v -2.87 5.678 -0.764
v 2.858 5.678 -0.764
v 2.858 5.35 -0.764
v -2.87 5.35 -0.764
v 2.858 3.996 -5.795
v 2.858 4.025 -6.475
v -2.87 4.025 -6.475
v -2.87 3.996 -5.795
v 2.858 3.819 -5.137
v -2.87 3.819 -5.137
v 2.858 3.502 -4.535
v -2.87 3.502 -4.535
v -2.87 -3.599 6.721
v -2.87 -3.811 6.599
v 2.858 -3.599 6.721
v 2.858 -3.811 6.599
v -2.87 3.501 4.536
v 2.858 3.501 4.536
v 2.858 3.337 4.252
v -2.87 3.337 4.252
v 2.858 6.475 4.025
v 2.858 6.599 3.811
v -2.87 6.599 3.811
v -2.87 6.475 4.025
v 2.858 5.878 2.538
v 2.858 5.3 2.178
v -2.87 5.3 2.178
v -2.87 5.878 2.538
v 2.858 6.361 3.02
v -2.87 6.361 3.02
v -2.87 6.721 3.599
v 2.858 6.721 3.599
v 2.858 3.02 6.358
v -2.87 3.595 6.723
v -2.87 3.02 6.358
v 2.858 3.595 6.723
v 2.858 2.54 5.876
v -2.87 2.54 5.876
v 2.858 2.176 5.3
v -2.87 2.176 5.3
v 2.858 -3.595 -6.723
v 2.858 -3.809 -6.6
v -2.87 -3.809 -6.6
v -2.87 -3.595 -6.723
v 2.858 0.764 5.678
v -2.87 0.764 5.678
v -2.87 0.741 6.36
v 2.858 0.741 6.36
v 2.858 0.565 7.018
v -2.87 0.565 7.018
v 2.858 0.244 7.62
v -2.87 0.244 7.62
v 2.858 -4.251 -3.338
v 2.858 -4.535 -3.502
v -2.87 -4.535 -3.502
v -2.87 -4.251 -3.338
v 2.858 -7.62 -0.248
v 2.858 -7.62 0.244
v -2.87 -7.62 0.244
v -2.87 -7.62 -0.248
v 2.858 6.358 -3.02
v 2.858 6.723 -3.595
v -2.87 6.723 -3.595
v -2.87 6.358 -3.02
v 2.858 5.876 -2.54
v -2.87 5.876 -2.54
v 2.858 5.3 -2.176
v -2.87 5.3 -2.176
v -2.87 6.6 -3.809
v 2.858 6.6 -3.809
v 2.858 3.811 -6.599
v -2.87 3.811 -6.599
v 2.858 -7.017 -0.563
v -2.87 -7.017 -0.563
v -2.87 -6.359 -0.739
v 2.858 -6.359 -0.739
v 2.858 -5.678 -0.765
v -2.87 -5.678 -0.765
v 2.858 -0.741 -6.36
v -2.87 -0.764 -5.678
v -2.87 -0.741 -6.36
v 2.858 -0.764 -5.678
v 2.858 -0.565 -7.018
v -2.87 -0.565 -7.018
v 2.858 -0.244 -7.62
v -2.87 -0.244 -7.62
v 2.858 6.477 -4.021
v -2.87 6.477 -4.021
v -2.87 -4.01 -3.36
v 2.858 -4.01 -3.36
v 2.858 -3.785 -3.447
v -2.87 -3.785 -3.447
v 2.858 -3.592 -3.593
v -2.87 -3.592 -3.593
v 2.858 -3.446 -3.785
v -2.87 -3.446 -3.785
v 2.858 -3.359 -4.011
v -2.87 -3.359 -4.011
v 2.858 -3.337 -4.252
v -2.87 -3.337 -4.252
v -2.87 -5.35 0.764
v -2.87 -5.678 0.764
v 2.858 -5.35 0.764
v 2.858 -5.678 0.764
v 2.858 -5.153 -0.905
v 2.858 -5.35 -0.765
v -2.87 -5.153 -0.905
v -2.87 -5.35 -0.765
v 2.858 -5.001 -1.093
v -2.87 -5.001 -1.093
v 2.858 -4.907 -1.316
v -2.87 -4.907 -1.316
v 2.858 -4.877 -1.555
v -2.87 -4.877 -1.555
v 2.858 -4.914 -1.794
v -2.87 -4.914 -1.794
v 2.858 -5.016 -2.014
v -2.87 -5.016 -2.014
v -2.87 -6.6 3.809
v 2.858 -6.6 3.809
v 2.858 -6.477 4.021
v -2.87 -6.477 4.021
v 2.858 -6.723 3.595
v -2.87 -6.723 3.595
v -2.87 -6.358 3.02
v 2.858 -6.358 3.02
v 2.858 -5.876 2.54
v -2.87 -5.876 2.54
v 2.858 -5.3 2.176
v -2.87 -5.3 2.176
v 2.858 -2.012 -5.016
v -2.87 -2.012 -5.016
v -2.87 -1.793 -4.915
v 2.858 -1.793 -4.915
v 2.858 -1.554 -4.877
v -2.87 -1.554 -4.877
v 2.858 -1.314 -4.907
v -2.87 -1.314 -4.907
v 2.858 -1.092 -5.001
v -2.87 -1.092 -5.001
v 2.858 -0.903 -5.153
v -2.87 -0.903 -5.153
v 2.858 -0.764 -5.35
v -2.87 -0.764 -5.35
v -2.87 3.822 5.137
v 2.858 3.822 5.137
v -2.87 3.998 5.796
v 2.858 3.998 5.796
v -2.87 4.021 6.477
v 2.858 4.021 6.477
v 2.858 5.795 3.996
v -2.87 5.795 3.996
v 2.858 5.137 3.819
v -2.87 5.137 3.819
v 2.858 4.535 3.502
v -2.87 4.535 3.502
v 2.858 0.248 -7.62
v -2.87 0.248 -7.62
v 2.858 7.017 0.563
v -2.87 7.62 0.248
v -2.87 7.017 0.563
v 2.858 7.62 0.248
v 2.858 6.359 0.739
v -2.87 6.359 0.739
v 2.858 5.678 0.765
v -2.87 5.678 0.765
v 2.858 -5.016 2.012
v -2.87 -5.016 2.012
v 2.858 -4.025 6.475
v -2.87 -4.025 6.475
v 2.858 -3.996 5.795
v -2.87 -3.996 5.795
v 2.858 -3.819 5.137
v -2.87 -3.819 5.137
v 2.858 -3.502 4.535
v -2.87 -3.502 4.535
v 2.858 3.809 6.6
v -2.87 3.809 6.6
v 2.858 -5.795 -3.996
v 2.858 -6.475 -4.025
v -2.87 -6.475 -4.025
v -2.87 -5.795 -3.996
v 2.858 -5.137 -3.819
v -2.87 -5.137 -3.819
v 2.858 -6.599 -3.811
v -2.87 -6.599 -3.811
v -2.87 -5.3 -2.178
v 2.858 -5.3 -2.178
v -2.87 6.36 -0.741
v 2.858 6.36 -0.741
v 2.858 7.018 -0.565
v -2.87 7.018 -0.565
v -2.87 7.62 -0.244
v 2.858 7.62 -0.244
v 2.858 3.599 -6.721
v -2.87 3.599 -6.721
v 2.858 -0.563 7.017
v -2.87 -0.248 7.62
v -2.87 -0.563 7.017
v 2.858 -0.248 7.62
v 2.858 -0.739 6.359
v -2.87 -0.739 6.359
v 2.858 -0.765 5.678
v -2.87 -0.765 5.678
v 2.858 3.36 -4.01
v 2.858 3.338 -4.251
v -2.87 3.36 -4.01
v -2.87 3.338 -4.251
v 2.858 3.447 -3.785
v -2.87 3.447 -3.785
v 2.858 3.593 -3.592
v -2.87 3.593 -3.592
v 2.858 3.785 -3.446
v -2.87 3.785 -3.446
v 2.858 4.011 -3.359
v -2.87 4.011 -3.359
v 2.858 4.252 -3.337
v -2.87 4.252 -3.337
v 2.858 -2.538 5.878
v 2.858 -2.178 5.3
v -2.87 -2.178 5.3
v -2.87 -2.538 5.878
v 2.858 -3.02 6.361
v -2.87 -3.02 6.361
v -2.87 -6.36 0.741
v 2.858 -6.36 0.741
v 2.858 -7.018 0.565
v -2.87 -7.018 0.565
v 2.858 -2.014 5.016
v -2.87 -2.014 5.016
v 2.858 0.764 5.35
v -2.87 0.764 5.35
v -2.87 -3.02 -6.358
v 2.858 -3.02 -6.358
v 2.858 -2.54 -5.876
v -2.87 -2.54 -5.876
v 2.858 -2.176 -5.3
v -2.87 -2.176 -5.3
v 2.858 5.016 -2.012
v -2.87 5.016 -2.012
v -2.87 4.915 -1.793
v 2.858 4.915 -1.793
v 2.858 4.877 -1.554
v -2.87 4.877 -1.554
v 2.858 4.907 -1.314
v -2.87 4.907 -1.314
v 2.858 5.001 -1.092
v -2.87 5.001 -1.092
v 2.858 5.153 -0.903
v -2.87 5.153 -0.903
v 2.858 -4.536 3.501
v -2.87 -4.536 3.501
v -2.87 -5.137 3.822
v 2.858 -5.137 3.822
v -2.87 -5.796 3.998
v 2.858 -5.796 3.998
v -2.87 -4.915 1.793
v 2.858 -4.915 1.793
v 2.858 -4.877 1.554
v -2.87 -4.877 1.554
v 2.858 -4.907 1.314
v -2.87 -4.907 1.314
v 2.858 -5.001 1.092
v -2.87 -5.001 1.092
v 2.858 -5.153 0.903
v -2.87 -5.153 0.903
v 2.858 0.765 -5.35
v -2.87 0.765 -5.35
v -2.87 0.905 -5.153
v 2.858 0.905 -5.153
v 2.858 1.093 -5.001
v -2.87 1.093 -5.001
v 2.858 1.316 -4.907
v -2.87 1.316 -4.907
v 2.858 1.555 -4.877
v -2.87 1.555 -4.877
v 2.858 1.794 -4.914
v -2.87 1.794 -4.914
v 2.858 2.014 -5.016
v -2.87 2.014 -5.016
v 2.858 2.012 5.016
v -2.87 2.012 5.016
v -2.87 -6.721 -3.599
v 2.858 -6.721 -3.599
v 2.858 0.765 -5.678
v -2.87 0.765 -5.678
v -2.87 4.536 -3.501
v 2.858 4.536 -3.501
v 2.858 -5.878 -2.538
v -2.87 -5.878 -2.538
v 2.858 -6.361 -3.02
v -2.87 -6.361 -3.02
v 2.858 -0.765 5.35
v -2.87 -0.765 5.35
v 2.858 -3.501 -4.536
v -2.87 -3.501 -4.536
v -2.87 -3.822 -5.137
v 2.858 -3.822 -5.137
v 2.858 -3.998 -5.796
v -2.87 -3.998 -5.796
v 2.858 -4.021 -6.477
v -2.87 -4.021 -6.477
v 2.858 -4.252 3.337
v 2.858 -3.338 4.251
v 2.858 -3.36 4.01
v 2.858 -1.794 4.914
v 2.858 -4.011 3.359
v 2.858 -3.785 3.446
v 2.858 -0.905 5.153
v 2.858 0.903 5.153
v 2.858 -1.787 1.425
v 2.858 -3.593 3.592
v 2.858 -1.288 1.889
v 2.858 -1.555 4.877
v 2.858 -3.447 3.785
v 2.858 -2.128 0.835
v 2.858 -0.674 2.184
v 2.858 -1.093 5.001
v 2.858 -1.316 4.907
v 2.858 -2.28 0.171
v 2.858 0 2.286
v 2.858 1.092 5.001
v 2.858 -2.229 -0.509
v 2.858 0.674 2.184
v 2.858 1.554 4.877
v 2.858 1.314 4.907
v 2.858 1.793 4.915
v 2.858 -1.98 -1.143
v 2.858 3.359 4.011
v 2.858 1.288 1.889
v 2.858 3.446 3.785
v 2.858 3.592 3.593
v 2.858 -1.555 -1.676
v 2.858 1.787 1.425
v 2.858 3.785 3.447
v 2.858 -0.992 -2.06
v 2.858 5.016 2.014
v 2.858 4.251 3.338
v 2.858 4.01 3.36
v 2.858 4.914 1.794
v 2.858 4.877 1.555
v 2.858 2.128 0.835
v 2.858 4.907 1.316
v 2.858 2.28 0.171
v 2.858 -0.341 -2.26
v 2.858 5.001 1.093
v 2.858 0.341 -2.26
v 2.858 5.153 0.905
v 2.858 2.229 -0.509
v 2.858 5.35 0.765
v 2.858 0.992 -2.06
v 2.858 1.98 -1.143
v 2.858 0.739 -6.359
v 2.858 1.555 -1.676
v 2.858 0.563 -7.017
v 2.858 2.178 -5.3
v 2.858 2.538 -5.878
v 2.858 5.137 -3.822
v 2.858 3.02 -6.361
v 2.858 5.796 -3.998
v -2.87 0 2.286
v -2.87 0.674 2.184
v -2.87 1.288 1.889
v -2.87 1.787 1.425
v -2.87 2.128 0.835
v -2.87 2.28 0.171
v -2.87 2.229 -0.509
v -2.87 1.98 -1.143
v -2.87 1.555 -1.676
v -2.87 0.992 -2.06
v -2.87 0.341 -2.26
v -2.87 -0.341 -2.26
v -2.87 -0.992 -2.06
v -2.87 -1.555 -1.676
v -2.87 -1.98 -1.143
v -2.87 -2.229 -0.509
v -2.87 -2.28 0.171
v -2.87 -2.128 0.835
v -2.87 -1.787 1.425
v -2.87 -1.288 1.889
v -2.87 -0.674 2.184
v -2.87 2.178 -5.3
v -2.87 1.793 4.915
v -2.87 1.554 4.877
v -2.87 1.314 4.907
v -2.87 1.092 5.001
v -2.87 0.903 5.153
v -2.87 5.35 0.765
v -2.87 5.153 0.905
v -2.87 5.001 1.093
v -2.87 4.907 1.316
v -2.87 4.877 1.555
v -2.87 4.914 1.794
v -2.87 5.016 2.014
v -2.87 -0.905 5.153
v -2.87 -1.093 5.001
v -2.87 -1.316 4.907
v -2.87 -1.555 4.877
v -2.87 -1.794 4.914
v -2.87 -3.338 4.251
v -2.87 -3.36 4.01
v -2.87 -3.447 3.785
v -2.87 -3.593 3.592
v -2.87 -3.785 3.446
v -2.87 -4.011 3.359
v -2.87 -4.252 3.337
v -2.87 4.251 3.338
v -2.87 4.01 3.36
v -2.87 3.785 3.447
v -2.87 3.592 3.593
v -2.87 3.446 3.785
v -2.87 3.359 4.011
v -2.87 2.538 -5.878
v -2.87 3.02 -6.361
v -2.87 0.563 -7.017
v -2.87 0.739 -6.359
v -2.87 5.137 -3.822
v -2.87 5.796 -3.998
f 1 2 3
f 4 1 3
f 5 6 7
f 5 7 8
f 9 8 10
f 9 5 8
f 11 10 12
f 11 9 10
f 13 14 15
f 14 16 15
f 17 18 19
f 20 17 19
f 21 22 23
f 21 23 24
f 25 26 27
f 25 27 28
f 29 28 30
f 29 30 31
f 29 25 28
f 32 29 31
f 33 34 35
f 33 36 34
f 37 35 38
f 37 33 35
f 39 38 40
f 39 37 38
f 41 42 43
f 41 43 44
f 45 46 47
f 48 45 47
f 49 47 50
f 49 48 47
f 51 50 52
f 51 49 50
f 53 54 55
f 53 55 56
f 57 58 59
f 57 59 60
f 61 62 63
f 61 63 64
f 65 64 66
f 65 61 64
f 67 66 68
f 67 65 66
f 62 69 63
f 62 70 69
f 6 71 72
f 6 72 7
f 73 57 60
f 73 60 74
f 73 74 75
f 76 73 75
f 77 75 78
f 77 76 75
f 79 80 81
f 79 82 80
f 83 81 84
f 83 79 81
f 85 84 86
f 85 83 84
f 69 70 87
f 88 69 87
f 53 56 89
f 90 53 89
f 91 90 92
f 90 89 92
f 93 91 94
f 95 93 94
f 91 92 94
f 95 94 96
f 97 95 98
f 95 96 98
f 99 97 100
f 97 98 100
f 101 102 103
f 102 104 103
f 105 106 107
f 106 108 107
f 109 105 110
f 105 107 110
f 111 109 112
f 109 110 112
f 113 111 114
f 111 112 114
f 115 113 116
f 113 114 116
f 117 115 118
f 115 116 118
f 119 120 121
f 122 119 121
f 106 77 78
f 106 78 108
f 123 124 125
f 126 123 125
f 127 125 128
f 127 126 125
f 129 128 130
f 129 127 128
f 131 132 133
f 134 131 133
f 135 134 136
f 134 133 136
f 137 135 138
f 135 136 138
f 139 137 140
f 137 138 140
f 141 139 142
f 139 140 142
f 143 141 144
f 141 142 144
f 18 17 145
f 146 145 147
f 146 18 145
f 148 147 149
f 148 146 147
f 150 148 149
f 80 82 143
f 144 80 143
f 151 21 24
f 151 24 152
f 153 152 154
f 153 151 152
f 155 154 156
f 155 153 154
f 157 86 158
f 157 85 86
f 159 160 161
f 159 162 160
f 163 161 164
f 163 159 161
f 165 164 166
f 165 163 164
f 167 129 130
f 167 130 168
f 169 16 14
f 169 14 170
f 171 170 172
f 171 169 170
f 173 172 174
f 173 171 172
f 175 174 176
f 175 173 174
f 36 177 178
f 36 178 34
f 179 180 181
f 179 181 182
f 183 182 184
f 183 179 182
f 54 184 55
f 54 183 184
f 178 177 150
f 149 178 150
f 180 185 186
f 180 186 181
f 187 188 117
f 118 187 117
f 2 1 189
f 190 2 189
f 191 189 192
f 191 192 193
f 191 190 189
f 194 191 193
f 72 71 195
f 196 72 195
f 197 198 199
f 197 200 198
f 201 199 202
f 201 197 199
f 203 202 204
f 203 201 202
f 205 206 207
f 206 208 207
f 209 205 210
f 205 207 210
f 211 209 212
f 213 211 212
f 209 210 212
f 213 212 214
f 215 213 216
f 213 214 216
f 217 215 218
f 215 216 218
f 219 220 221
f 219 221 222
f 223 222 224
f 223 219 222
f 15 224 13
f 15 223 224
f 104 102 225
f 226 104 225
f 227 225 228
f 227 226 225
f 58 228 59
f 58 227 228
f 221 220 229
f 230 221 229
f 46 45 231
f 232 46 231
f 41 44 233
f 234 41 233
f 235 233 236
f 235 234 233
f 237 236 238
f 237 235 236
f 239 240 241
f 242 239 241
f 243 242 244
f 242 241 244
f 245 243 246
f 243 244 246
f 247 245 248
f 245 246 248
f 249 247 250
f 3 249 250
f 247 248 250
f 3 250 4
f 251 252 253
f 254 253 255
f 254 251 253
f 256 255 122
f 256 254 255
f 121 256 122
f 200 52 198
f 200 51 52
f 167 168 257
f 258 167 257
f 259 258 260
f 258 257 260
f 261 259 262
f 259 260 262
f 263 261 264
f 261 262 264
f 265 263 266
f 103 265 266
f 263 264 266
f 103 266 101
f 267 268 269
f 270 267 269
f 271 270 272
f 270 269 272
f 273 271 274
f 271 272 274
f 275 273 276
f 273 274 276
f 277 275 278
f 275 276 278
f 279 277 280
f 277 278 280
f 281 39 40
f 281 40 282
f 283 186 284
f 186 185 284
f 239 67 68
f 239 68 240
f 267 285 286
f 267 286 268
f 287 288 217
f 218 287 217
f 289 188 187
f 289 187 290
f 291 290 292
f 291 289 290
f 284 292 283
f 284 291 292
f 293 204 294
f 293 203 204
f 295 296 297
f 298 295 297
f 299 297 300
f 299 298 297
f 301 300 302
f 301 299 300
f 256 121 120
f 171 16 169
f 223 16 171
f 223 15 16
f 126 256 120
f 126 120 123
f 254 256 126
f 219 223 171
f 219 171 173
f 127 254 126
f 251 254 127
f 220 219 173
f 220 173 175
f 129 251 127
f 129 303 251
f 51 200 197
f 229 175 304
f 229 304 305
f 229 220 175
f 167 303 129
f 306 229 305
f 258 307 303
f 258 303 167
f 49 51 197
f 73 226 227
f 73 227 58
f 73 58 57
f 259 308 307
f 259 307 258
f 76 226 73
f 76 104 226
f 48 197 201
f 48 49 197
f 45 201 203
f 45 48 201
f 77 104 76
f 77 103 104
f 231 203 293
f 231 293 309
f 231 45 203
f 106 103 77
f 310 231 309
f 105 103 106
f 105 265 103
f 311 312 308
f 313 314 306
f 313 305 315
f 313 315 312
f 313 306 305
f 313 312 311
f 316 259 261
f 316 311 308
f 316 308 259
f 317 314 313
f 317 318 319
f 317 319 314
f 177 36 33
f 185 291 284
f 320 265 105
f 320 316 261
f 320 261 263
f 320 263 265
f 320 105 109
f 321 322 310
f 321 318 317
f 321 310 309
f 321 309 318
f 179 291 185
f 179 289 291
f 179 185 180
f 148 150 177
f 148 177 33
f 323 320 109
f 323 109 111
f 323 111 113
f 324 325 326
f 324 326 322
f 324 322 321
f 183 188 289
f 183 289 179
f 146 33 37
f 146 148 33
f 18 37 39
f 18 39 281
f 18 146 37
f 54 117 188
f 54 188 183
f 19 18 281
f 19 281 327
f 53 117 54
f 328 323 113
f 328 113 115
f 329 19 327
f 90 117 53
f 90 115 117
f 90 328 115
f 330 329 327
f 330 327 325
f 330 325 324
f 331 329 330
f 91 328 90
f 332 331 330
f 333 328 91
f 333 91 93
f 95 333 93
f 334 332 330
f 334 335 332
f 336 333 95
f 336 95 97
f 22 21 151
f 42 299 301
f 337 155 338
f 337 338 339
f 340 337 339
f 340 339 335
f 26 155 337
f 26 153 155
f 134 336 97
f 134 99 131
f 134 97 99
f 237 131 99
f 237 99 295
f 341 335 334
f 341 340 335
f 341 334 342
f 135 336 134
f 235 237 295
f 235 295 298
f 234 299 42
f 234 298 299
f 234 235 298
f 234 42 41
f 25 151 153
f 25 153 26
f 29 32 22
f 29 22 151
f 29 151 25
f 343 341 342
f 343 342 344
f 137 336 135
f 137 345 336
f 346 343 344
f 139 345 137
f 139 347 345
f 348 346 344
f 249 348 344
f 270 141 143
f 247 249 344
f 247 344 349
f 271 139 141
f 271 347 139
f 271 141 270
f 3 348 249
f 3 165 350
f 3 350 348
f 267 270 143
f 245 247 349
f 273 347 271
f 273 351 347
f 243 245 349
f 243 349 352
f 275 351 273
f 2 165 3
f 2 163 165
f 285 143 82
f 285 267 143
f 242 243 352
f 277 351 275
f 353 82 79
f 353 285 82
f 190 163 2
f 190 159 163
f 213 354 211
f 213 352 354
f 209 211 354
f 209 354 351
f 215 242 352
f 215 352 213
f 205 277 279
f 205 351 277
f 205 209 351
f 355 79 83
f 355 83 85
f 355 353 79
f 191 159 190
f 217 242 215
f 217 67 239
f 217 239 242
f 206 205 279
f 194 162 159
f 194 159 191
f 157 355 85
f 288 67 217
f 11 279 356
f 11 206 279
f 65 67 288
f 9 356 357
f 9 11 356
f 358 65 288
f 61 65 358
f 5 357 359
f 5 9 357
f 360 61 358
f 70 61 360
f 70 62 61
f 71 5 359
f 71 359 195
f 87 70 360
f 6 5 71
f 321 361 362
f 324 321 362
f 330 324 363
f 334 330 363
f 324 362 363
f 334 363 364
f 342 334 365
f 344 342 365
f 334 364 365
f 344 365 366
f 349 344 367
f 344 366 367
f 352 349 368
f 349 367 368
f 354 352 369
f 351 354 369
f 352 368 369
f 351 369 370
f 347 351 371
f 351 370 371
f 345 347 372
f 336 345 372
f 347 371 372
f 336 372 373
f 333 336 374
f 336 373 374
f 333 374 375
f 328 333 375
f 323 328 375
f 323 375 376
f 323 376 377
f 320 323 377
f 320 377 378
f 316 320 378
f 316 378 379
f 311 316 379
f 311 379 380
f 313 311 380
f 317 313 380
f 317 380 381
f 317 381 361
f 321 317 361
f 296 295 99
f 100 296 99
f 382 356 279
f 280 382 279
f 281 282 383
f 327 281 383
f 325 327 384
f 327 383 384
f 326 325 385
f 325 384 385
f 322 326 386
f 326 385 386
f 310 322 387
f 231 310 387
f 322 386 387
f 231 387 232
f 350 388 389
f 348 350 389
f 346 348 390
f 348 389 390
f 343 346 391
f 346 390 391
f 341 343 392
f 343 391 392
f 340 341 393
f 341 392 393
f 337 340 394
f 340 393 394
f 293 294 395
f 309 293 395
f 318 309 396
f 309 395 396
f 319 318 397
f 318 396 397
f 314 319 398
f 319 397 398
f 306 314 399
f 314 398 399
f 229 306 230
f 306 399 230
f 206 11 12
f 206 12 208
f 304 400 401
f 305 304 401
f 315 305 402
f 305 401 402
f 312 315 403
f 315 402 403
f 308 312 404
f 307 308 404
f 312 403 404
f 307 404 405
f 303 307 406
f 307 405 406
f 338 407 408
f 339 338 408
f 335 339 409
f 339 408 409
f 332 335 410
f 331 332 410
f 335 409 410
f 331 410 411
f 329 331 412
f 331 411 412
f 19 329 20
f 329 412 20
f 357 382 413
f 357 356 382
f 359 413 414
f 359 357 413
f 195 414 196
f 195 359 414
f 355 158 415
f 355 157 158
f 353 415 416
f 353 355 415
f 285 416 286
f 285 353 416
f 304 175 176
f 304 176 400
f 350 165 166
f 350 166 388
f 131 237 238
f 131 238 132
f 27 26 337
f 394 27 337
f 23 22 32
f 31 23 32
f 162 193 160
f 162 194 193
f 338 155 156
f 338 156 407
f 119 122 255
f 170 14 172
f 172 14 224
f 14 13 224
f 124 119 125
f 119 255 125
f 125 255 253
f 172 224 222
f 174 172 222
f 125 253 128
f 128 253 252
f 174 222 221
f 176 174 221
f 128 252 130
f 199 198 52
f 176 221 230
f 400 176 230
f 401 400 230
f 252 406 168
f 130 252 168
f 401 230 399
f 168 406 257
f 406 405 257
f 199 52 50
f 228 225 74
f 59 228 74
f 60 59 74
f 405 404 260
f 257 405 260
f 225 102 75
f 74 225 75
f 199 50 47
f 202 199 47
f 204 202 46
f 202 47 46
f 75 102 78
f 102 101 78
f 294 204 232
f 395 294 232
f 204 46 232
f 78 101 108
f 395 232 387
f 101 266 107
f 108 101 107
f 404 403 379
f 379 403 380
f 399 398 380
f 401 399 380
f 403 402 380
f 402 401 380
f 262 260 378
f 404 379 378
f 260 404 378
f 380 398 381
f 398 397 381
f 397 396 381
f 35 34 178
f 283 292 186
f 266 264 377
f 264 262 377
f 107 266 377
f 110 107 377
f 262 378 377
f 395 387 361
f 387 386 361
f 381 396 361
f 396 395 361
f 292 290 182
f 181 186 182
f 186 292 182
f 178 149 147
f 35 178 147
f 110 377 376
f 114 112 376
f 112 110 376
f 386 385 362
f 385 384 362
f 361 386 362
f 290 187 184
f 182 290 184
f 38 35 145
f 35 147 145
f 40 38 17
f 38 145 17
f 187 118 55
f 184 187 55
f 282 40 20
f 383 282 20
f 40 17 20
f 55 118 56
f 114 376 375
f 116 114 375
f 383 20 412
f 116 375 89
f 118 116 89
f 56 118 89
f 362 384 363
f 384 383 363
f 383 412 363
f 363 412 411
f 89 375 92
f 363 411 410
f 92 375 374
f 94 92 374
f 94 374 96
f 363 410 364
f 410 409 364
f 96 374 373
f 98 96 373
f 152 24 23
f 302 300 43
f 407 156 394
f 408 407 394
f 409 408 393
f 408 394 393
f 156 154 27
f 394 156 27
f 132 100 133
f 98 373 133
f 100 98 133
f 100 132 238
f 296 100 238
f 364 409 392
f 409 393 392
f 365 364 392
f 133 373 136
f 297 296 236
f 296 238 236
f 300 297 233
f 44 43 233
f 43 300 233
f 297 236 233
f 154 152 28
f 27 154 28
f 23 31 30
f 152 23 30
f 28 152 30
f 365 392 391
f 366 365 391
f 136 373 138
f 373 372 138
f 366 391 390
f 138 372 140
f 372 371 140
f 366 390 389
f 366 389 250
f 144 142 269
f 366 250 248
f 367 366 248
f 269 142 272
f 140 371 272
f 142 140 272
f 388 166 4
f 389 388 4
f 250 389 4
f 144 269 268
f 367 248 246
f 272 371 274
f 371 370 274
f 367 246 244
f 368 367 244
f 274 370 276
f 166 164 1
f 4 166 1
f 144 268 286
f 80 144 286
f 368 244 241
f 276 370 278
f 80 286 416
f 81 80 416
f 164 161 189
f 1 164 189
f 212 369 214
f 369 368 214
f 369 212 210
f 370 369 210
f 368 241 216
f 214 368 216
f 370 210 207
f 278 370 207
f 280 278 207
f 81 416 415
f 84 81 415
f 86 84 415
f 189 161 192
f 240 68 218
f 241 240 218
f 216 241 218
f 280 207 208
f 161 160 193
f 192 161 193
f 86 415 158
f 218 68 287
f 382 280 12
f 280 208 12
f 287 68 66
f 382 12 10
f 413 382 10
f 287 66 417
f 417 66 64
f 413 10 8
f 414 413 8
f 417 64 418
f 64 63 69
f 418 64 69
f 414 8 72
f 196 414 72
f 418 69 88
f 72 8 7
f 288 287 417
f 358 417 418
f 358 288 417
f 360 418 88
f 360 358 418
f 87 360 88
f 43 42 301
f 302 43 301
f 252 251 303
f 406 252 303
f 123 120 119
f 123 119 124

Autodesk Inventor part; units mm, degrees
ref_plane "YZ Plane" through (0, 0, 0) normal (1, 0, 0) x (0, 1, 0)
ref_plane "XZ Plane" through (0, 0, 0) normal (0, 1, 0) x (-1, 0, 0)
ref_plane "Work Plane2" through (2.8575, 0, 0) normal (1, 0, 0) x (0, 0, -1)
sketch "Sketch6" plane through (2.8575, 0, 0) normal (1, 0, 0) x (0, 0, -1)
  line L0 (0.7654, -5.6784) -> (0.7654, -5.022)
  line L1 (-0.7638, -5.6784) -> (-0.7638, -5.0222)
  arc A0 (5.6006, 2.3498) -> (5.5837, 2.3418) centre (6.3532, 0.7382) ccw
  arc A1 (-0.7638, -5.0222) -> (0.7654, -5.022) centre (0, 0) ccw
  line L2 (0.0008, -7.62) -> (-0.2439, -7.62)
  line L3 (0.0008, -7.62) -> (0.2479, -7.62)
  arc A2 (0.2479, -7.62) -> (0.7654, -5.6784) centre (-2.309, -5.8988) ccw
  arc A3 (-0.7638, -5.6784) -> (-0.2439, -7.62) centre (2.2185, -5.9201) ccw
  arc A4 (3.5877, -3.5965) -> (3.5976, -3.5866) centre (0, 0) ccw
  line L4 (3.502, -4.5349) -> (3.1738, -3.9665)
  line L5 (2.1777, -5.2996) -> (1.8496, -4.7313)
  arc A5 (1.8496, -4.7313) -> (3.1738, -3.9665) centre (0, 0) ccw
  line L6 (3.8107, -6.5987) -> (3.5988, -6.721)
  line L7 (3.8107, -6.5987) -> (4.0247, -6.4752)
  arc A6 (4.0247, -6.4752) -> (3.502, -4.5349) centre (0.9498, -6.263) ccw
  arc A7 (2.1777, -5.2996) -> (3.5988, -6.721) centre (4.8813, -4.0177) ccw
  line L8 (5.3003, -2.1764) -> (4.7319, -1.8482)
  line L9 (4.5358, -3.5007) -> (3.9675, -3.1726)
  arc A8 (3.9675, -3.1726) -> (4.7319, -1.8482) centre (0, 0) ccw
  line L10 (6.5995, -3.8093) -> (6.4772, -4.0212)
  line L11 (6.5995, -3.8093) -> (6.7231, -3.5953)
  arc A9 (6.7231, -3.5953) -> (5.3003, -2.1764) centre (3.954, -4.949) ccw
  arc A10 (4.5358, -3.5007) -> (6.4772, -4.0212) centre (6.2362, -1.0388) ccw
  line L12 (5.6784, 0.7654) -> (5.022, 0.7654)
  line L13 (5.6784, -0.7638) -> (5.0222, -0.7638)
  arc A11 (5.0222, -0.7638) -> (5.022, 0.7654) centre (0, 0) ccw
  line L14 (7.62, 0.0008) -> (7.62, -0.2439)
  line L15 (7.62, 0.0008) -> (7.62, 0.2479)
  arc A12 (7.62, 0.2479) -> (5.6784, 0.7654) centre (5.8988, -2.309) ccw
  arc A13 (5.6784, -0.7638) -> (7.62, -0.2439) centre (5.9201, 2.2185) ccw
  line L16 (4.5349, 3.502) -> (3.9665, 3.1738)
  line L17 (5.2996, 2.1777) -> (4.7313, 1.8496)
  arc A14 (4.7313, 1.8496) -> (3.9665, 3.1738) centre (0, 0) ccw
  line L18 (6.5987, 3.8107) -> (6.721, 3.5988)
  line L19 (6.5987, 3.8107) -> (6.4752, 4.0247)
  arc A15 (6.4752, 4.0247) -> (4.5349, 3.502) centre (6.263, 0.9498) ccw
  arc A16 (5.2996, 2.1777) -> (6.721, 3.5988) centre (4.0177, 4.8813) ccw
  line L20 (2.1764, 5.3003) -> (1.8482, 4.7319)
  line L21 (3.5007, 4.5358) -> (3.1726, 3.9675)
  arc A17 (3.1726, 3.9675) -> (1.8482, 4.7319) centre (0, 0) ccw
  line L22 (3.8093, 6.5995) -> (4.0212, 6.4772)
  line L23 (3.8093, 6.5995) -> (3.5953, 6.7231)
  arc A18 (3.5953, 6.7231) -> (2.1764, 5.3003) centre (4.949, 3.954) ccw
  arc A19 (3.5007, 4.5358) -> (4.0212, 6.4772) centre (1.0388, 6.2362) ccw
  line L24 (-0.7654, 5.6784) -> (-0.7654, 5.022)
  line L25 (0.7638, 5.6784) -> (0.7638, 5.0222)
  arc A20 (0.7638, 5.0222) -> (-0.7654, 5.022) centre (0, 0) ccw
  line L26 (-0.0008, 7.62) -> (0.2439, 7.62)
  line L27 (-0.0008, 7.62) -> (-0.2479, 7.62)
  arc A21 (-0.2479, 7.62) -> (-0.7654, 5.6784) centre (2.309, 5.8988) ccw
  arc A22 (0.7638, 5.6784) -> (0.2439, 7.62) centre (-2.2185, 5.9201) ccw
  line L28 (-3.502, 4.5349) -> (-3.1738, 3.9665)
  line L29 (-2.1777, 5.2996) -> (-1.8496, 4.7313)
  arc A23 (-1.8496, 4.7313) -> (-3.1738, 3.9665) centre (0, 0) ccw
  line L30 (-3.8107, 6.5987) -> (-3.5988, 6.721)
  line L31 (-3.8107, 6.5987) -> (-4.0247, 6.4752)
  arc A24 (-4.0247, 6.4752) -> (-3.502, 4.5349) centre (-0.9498, 6.263) ccw
  arc A25 (-2.1777, 5.2996) -> (-3.5988, 6.721) centre (-4.8813, 4.0177) ccw
  line L32 (-5.3003, 2.1764) -> (-4.7319, 1.8482)
  line L33 (-4.5358, 3.5007) -> (-3.9675, 3.1726)
  arc A26 (-3.9675, 3.1726) -> (-4.7319, 1.8482) centre (0, 0) ccw
  line L34 (-6.5995, 3.8093) -> (-6.4772, 4.0212)
  line L35 (-6.5995, 3.8093) -> (-6.7231, 3.5953)
  arc A27 (-6.7231, 3.5953) -> (-5.3003, 2.1764) centre (-3.954, 4.949) ccw
  arc A28 (-4.5358, 3.5007) -> (-6.4772, 4.0212) centre (-6.2362, 1.0388) ccw
  line L36 (-5.6784, -0.7654) -> (-5.022, -0.7654)
  line L37 (-5.6784, 0.7638) -> (-5.0222, 0.7638)
  arc A29 (-5.0222, 0.7638) -> (-5.022, -0.7654) centre (0, 0) ccw
  line L38 (-7.62, -0.0008) -> (-7.62, 0.2439)
  line L39 (-7.62, -0.0008) -> (-7.62, -0.2479)
  arc A30 (-7.62, -0.2479) -> (-5.6784, -0.7654) centre (-5.8988, 2.309) ccw
  arc A31 (-5.6784, 0.7638) -> (-7.62, 0.2439) centre (-5.9201, -2.2185) ccw
  line L40 (-4.5349, -3.502) -> (-3.9665, -3.1738)
  line L41 (-5.2996, -2.1777) -> (-4.7313, -1.8496)
  arc A32 (-4.7313, -1.8496) -> (-3.9665, -3.1738) centre (0, 0) ccw
  line L42 (-6.5987, -3.8107) -> (-6.721, -3.5988)
  line L43 (-6.5987, -3.8107) -> (-6.4752, -4.0247)
  arc A33 (-6.4752, -4.0247) -> (-4.5349, -3.502) centre (-6.263, -0.9498) ccw
  arc A34 (-5.2996, -2.1777) -> (-6.721, -3.5988) centre (-4.0177, -4.8813) ccw
  line L44 (-2.1764, -5.3003) -> (-1.8482, -4.7319)
  line L45 (-3.5007, -4.5358) -> (-3.1726, -3.9675)
  arc A35 (-3.1726, -3.9675) -> (-1.8482, -4.7319) centre (0, 0) ccw
  line L46 (-3.8093, -6.5995) -> (-4.0212, -6.4772)
  line L47 (-3.8093, -6.5995) -> (-3.5953, -6.7231)
  arc A36 (-3.5953, -6.7231) -> (-2.1764, -5.3003) centre (-4.949, -3.954) ccw
  arc A37 (-3.5007, -4.5358) -> (-4.0212, -6.4772) centre (-1.0388, -6.2362) ccw
  arc A38 (-1.8482, -4.7319) -> (-0.7638, -5.0222) centre (0, 0) ccw
  line L48 (-2.0137, 5.0155) -> (-0.7654, 5.3502)
  line L49 (0.7638, 5.3503) -> (2.0123, 5.0161)
  line L50 (3.3367, 4.2516) -> (4.2507, 3.3379)
  line L51 (5.0155, 2.0137) -> (5.3502, 0.7654)
  line L52 (5.3503, -0.7638) -> (5.0161, -2.0123)
  line L53 (4.2516, -3.3367) -> (3.3379, -4.2507)
  line L54 (2.0137, -5.0155) -> (0.7654, -5.3502)
  line L55 (-0.7638, -5.3503) -> (-2.0123, -5.0161)
  line L56 (-3.3367, -4.2516) -> (-4.2507, -3.3379)
  line L57 (-5.0155, -2.0137) -> (-5.3502, -0.7654)
  line L58 (-5.3503, 0.7638) -> (-5.0161, 2.0123)
  line L59 (-4.2516, 3.3367) -> (-3.3379, 4.2507)
  circle A39 centre (0, 0) radius 5.0531
  point P0 (0, 0)
  point P1 (-4.2516, 3.3367)
  dimension "d94" = 360
extrude "Extrusion19" add sketch "Sketch6" against normal blind 5.7277 contours A2 L3 L2 A3 L1 A1 L0 | L0 A1 A38 A35 L45 L56 L40 A32 L41 L57 L36 A29 L37 L58 L32 A26 L33 L59 L28 A23 L29 L48 L24 A20 L25 L49 L20 A17 L21 L50 L16 A14 L17 L51 L12 A11 L13 L52 L8 A8 L9 L53 L4 A5 L5 L54 | L5 A5 L4 A6 L7 L6 A7 | L1 L55 L44 A38 | L44 A36 L47 L46 A37 L45 A35 | L9 A8 L8 A9 L11 L10 A10 | L40 A33 L43 L42 A34 L41 A32 | L13 A11 L12 A12 L15 L14 A13 | L36 A30 L39 L38 A31 L37 A29 | L17 A14 L16 A15 L19 L18 A16 | L32 A27 L35 L34 A28 L33 A26 | L21 A17 L20 A18 L23 L22 A19 | L28 A24 L31 L30 A25 L29 A23 | L25 A20 L24 A21 L27 L26 A22 | A39
sketch "Sketch7" plane through (-2.8702, 0, 0) normal (-1, 0, 0) x (0, 0, 1)
  circle A0 centre (0, 0) radius 2.286
  dimension "d104" = 4.572
extrude "Extrusion20" cut sketch "Sketch7" against normal blind 2540
sketch "Sketch8" plane through (-2.8702, 0, 0) normal (-1, 0, 0) x (0, 0, 1)
  circle A0 centre (0, 0) radius 5.08
  line L0 (-3.3367, 4.2516) -> (-4.2507, 3.3379) projected
  arc A1 (-4.2507, 3.3379) -> (-3.3367, 4.2516) centre (-4.209, 4.2103) ccw
  line L1 (-3.3367, 4.2516) -> (-3.5007, 4.5358) projected
  line L2 (-4.2507, 3.3379) -> (-3.3367, 4.2516)
  arc A2 (-5.3502, 0.7654) -> (-5.0155, 2.0137) centre (-5.7503, 1.5417) ccw
  line L3 (-5.3502, 0.7654) -> (-5.0155, 2.0137)
  arc A3 (-5.0161, -2.0123) -> (-5.3503, -0.7638) centre (-5.7507, -1.54) ccw
  line L4 (-5.0161, -2.0123) -> (-5.3503, -0.7638)
  arc A4 (-3.3379, -4.2507) -> (-4.2516, -3.3367) centre (-4.2103, -4.209) ccw
  line L5 (-3.3379, -4.2507) -> (-4.2516, -3.3367)
  arc A5 (-0.7654, -5.3502) -> (-2.0137, -5.0155) centre (-1.5417, -5.7503) ccw
  line L6 (-0.7654, -5.3502) -> (-2.0137, -5.0155)
  arc A6 (2.0123, -5.0161) -> (0.7638, -5.3503) centre (1.54, -5.7507) ccw
  line L7 (2.0123, -5.0161) -> (0.7638, -5.3503)
  arc A7 (4.2507, -3.3379) -> (3.3367, -4.2516) centre (4.209, -4.2103) ccw
  line L8 (4.2507, -3.3379) -> (3.3367, -4.2516)
  arc A8 (5.3502, -0.7654) -> (5.0155, -2.0137) centre (5.7503, -1.5417) ccw
  line L9 (5.3502, -0.7654) -> (5.0155, -2.0137)
  arc A9 (5.0161, 2.0123) -> (5.3503, 0.7638) centre (5.7507, 1.54) ccw
  line L10 (5.0161, 2.0123) -> (5.3503, 0.7638)
  arc A10 (3.3379, 4.2507) -> (4.2516, 3.3367) centre (4.2103, 4.209) ccw
  line L11 (3.3379, 4.2507) -> (4.2516, 3.3367)
  arc A11 (0.7654, 5.3502) -> (2.0137, 5.0155) centre (1.5417, 5.7503) ccw
  line L12 (0.7654, 5.3502) -> (2.0137, 5.0155)
  arc A12 (-2.0123, 5.0161) -> (-0.7638, 5.3503) centre (-1.54, 5.7507) ccw
  line L13 (-2.0123, 5.0161) -> (-0.7638, 5.3503)
  dimension "d107" = 10.16
  dimension "d110" = 360
extrude "Extrusion21" cut sketch "Sketch8" against normal blind 2540 contours A8 L9 | A7 L8 | A6 L7 | A5 L6 | A4 L5 | A3 L4 | A2 L3 | A1 L0 | A12 L13 | A11 L12 | A10 L11 | A9 L10
properties part number "Pinion final"
